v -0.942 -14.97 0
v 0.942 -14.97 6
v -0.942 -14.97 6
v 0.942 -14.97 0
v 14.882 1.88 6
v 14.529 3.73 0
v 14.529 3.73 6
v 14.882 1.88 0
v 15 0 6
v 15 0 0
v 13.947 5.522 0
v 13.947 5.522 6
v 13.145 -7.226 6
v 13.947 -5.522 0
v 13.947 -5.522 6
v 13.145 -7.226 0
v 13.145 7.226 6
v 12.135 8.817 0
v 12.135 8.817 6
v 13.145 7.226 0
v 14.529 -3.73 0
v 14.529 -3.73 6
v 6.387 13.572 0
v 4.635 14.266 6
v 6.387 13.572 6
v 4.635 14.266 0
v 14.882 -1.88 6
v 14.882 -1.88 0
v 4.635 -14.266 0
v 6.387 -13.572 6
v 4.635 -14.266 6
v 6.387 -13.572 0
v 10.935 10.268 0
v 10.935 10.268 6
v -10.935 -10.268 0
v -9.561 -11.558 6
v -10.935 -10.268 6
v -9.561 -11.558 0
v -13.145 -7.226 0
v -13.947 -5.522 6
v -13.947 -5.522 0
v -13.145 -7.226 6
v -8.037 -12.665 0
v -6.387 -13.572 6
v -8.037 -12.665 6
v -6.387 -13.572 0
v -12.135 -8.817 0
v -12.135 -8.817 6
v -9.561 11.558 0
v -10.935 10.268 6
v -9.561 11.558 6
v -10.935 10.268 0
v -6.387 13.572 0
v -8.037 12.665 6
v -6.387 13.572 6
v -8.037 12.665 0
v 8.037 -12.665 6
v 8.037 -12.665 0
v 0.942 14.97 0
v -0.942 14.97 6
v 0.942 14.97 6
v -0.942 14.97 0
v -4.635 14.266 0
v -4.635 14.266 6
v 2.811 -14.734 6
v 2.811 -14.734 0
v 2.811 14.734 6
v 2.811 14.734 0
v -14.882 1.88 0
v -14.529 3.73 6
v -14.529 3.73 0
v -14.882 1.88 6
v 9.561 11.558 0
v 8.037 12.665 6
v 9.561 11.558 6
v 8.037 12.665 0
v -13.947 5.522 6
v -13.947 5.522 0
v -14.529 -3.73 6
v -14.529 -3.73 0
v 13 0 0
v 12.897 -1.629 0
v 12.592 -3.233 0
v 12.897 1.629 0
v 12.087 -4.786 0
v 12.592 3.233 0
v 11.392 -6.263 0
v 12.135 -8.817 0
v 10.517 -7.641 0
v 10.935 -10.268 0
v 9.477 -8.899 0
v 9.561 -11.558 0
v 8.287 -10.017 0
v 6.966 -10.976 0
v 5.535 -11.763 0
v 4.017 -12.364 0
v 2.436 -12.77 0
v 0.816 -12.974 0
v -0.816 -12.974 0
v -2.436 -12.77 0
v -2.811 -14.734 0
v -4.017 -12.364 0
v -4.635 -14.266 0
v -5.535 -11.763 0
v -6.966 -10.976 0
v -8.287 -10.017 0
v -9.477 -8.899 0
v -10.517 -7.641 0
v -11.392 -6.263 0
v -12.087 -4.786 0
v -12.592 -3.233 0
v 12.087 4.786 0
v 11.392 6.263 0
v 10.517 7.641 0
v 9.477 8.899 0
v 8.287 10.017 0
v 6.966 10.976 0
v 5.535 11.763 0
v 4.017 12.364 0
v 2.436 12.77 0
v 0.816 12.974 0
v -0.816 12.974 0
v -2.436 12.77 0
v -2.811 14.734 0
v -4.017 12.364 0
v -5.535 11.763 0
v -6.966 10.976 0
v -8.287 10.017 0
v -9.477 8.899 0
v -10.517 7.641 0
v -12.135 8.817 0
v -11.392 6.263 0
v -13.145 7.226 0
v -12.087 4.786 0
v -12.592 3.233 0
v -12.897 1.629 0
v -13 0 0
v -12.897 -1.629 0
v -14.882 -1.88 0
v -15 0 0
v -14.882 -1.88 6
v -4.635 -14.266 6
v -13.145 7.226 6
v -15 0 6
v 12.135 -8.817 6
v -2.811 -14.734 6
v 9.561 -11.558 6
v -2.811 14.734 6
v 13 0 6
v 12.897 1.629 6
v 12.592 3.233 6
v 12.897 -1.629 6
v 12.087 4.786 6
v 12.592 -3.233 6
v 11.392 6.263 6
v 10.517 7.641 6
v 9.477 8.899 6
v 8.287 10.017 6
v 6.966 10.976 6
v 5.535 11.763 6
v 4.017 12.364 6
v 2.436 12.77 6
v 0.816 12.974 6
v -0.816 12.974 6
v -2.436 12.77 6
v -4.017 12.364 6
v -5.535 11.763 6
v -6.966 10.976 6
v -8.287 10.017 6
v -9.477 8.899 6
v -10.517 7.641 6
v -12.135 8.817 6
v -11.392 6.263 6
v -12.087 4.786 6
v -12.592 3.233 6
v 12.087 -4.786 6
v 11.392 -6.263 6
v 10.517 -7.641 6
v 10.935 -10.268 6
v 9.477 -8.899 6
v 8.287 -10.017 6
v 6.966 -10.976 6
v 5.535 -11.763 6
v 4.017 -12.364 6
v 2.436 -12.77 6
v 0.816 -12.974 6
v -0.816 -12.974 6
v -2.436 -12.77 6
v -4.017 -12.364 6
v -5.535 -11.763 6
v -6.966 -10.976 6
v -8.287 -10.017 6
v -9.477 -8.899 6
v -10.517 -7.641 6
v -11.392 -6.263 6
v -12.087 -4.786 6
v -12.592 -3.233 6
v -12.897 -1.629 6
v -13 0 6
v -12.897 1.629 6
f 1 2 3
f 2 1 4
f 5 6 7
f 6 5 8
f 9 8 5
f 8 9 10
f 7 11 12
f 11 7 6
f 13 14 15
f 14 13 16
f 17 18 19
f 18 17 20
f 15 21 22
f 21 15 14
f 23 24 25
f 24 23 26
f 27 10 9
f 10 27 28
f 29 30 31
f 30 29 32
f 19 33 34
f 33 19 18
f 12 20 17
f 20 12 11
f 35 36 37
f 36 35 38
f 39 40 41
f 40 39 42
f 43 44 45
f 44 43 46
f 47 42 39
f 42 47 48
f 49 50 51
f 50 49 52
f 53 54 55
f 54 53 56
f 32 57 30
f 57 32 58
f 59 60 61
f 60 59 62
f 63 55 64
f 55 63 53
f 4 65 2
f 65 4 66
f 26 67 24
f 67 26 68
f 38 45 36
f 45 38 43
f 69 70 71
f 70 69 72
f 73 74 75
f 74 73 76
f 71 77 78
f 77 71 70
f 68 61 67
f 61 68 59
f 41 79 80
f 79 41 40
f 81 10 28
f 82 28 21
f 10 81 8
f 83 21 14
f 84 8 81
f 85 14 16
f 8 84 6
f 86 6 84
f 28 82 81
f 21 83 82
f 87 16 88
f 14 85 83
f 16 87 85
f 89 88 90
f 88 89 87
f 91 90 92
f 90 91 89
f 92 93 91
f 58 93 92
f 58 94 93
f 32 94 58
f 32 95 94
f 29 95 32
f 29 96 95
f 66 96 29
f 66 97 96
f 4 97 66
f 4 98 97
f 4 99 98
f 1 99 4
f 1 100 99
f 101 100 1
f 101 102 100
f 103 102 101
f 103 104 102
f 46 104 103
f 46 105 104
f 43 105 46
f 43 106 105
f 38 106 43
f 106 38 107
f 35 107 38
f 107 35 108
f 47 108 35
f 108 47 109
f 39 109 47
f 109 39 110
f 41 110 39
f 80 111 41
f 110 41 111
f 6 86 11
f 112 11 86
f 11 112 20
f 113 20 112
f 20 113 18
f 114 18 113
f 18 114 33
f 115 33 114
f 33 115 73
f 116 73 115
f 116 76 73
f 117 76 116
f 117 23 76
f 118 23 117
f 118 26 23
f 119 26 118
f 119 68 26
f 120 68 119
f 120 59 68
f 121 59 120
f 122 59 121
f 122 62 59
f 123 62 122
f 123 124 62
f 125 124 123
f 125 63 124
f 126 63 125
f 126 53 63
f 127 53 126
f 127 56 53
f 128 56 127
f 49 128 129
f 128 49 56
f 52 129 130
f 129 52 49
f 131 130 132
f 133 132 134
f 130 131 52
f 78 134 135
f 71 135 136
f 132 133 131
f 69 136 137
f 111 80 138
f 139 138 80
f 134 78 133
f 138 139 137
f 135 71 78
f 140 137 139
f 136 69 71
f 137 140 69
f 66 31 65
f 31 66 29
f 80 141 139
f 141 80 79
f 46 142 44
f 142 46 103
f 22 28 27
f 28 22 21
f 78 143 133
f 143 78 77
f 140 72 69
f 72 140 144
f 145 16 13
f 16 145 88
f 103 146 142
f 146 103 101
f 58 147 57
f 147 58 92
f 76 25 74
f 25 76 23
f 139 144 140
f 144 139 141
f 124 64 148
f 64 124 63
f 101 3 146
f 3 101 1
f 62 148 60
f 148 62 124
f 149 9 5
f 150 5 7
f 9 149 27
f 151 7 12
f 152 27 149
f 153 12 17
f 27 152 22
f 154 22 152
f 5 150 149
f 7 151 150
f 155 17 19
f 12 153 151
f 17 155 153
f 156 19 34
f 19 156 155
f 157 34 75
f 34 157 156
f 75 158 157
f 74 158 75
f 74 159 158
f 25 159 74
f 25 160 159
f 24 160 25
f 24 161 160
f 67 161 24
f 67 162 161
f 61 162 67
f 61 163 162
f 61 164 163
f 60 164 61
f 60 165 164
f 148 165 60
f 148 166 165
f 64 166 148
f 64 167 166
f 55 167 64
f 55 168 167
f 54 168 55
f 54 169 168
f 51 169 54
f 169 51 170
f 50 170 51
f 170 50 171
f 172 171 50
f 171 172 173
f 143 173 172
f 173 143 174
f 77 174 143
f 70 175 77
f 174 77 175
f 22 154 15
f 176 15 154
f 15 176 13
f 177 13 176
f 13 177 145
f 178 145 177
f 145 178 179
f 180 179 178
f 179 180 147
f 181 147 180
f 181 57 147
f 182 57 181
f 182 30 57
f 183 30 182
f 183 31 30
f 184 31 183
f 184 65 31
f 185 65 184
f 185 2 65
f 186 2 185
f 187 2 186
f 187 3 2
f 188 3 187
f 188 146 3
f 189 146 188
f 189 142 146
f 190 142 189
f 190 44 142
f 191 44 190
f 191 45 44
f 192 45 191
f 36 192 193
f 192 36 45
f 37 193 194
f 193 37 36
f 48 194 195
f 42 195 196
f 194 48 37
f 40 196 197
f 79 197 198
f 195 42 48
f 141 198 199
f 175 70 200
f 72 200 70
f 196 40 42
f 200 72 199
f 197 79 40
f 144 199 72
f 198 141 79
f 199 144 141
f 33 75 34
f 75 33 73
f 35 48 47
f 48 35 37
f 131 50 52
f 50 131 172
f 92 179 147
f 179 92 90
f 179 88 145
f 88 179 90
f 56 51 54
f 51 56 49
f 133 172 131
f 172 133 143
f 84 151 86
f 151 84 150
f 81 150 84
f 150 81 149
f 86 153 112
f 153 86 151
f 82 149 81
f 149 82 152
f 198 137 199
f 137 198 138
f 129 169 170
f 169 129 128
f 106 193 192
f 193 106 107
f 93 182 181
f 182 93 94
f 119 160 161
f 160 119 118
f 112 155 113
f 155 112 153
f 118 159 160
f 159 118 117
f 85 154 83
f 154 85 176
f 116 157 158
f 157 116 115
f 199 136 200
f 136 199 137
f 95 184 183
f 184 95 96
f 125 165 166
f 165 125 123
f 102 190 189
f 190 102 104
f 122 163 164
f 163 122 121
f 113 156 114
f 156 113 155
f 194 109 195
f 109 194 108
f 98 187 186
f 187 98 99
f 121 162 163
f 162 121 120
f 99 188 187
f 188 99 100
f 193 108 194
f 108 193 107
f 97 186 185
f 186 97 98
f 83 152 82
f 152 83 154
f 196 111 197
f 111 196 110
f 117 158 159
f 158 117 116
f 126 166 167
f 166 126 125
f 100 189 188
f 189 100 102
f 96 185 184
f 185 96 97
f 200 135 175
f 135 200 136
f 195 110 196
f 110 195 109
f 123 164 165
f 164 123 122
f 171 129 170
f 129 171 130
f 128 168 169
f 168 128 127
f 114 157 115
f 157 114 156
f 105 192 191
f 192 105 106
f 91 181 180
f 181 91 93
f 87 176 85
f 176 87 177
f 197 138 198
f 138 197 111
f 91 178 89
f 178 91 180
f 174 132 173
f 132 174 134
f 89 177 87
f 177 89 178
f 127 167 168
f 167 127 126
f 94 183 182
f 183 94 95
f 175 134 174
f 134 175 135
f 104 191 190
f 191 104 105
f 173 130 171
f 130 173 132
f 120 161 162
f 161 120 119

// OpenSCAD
$fn = 50;

shell = 2;
innerRadius = 13;
outerRadius = innerRadius + shell;
height = 6;

difference() {
    cylinder(height, r=outerRadius);
    cylinder(height + 2, r=innerRadius);
}
